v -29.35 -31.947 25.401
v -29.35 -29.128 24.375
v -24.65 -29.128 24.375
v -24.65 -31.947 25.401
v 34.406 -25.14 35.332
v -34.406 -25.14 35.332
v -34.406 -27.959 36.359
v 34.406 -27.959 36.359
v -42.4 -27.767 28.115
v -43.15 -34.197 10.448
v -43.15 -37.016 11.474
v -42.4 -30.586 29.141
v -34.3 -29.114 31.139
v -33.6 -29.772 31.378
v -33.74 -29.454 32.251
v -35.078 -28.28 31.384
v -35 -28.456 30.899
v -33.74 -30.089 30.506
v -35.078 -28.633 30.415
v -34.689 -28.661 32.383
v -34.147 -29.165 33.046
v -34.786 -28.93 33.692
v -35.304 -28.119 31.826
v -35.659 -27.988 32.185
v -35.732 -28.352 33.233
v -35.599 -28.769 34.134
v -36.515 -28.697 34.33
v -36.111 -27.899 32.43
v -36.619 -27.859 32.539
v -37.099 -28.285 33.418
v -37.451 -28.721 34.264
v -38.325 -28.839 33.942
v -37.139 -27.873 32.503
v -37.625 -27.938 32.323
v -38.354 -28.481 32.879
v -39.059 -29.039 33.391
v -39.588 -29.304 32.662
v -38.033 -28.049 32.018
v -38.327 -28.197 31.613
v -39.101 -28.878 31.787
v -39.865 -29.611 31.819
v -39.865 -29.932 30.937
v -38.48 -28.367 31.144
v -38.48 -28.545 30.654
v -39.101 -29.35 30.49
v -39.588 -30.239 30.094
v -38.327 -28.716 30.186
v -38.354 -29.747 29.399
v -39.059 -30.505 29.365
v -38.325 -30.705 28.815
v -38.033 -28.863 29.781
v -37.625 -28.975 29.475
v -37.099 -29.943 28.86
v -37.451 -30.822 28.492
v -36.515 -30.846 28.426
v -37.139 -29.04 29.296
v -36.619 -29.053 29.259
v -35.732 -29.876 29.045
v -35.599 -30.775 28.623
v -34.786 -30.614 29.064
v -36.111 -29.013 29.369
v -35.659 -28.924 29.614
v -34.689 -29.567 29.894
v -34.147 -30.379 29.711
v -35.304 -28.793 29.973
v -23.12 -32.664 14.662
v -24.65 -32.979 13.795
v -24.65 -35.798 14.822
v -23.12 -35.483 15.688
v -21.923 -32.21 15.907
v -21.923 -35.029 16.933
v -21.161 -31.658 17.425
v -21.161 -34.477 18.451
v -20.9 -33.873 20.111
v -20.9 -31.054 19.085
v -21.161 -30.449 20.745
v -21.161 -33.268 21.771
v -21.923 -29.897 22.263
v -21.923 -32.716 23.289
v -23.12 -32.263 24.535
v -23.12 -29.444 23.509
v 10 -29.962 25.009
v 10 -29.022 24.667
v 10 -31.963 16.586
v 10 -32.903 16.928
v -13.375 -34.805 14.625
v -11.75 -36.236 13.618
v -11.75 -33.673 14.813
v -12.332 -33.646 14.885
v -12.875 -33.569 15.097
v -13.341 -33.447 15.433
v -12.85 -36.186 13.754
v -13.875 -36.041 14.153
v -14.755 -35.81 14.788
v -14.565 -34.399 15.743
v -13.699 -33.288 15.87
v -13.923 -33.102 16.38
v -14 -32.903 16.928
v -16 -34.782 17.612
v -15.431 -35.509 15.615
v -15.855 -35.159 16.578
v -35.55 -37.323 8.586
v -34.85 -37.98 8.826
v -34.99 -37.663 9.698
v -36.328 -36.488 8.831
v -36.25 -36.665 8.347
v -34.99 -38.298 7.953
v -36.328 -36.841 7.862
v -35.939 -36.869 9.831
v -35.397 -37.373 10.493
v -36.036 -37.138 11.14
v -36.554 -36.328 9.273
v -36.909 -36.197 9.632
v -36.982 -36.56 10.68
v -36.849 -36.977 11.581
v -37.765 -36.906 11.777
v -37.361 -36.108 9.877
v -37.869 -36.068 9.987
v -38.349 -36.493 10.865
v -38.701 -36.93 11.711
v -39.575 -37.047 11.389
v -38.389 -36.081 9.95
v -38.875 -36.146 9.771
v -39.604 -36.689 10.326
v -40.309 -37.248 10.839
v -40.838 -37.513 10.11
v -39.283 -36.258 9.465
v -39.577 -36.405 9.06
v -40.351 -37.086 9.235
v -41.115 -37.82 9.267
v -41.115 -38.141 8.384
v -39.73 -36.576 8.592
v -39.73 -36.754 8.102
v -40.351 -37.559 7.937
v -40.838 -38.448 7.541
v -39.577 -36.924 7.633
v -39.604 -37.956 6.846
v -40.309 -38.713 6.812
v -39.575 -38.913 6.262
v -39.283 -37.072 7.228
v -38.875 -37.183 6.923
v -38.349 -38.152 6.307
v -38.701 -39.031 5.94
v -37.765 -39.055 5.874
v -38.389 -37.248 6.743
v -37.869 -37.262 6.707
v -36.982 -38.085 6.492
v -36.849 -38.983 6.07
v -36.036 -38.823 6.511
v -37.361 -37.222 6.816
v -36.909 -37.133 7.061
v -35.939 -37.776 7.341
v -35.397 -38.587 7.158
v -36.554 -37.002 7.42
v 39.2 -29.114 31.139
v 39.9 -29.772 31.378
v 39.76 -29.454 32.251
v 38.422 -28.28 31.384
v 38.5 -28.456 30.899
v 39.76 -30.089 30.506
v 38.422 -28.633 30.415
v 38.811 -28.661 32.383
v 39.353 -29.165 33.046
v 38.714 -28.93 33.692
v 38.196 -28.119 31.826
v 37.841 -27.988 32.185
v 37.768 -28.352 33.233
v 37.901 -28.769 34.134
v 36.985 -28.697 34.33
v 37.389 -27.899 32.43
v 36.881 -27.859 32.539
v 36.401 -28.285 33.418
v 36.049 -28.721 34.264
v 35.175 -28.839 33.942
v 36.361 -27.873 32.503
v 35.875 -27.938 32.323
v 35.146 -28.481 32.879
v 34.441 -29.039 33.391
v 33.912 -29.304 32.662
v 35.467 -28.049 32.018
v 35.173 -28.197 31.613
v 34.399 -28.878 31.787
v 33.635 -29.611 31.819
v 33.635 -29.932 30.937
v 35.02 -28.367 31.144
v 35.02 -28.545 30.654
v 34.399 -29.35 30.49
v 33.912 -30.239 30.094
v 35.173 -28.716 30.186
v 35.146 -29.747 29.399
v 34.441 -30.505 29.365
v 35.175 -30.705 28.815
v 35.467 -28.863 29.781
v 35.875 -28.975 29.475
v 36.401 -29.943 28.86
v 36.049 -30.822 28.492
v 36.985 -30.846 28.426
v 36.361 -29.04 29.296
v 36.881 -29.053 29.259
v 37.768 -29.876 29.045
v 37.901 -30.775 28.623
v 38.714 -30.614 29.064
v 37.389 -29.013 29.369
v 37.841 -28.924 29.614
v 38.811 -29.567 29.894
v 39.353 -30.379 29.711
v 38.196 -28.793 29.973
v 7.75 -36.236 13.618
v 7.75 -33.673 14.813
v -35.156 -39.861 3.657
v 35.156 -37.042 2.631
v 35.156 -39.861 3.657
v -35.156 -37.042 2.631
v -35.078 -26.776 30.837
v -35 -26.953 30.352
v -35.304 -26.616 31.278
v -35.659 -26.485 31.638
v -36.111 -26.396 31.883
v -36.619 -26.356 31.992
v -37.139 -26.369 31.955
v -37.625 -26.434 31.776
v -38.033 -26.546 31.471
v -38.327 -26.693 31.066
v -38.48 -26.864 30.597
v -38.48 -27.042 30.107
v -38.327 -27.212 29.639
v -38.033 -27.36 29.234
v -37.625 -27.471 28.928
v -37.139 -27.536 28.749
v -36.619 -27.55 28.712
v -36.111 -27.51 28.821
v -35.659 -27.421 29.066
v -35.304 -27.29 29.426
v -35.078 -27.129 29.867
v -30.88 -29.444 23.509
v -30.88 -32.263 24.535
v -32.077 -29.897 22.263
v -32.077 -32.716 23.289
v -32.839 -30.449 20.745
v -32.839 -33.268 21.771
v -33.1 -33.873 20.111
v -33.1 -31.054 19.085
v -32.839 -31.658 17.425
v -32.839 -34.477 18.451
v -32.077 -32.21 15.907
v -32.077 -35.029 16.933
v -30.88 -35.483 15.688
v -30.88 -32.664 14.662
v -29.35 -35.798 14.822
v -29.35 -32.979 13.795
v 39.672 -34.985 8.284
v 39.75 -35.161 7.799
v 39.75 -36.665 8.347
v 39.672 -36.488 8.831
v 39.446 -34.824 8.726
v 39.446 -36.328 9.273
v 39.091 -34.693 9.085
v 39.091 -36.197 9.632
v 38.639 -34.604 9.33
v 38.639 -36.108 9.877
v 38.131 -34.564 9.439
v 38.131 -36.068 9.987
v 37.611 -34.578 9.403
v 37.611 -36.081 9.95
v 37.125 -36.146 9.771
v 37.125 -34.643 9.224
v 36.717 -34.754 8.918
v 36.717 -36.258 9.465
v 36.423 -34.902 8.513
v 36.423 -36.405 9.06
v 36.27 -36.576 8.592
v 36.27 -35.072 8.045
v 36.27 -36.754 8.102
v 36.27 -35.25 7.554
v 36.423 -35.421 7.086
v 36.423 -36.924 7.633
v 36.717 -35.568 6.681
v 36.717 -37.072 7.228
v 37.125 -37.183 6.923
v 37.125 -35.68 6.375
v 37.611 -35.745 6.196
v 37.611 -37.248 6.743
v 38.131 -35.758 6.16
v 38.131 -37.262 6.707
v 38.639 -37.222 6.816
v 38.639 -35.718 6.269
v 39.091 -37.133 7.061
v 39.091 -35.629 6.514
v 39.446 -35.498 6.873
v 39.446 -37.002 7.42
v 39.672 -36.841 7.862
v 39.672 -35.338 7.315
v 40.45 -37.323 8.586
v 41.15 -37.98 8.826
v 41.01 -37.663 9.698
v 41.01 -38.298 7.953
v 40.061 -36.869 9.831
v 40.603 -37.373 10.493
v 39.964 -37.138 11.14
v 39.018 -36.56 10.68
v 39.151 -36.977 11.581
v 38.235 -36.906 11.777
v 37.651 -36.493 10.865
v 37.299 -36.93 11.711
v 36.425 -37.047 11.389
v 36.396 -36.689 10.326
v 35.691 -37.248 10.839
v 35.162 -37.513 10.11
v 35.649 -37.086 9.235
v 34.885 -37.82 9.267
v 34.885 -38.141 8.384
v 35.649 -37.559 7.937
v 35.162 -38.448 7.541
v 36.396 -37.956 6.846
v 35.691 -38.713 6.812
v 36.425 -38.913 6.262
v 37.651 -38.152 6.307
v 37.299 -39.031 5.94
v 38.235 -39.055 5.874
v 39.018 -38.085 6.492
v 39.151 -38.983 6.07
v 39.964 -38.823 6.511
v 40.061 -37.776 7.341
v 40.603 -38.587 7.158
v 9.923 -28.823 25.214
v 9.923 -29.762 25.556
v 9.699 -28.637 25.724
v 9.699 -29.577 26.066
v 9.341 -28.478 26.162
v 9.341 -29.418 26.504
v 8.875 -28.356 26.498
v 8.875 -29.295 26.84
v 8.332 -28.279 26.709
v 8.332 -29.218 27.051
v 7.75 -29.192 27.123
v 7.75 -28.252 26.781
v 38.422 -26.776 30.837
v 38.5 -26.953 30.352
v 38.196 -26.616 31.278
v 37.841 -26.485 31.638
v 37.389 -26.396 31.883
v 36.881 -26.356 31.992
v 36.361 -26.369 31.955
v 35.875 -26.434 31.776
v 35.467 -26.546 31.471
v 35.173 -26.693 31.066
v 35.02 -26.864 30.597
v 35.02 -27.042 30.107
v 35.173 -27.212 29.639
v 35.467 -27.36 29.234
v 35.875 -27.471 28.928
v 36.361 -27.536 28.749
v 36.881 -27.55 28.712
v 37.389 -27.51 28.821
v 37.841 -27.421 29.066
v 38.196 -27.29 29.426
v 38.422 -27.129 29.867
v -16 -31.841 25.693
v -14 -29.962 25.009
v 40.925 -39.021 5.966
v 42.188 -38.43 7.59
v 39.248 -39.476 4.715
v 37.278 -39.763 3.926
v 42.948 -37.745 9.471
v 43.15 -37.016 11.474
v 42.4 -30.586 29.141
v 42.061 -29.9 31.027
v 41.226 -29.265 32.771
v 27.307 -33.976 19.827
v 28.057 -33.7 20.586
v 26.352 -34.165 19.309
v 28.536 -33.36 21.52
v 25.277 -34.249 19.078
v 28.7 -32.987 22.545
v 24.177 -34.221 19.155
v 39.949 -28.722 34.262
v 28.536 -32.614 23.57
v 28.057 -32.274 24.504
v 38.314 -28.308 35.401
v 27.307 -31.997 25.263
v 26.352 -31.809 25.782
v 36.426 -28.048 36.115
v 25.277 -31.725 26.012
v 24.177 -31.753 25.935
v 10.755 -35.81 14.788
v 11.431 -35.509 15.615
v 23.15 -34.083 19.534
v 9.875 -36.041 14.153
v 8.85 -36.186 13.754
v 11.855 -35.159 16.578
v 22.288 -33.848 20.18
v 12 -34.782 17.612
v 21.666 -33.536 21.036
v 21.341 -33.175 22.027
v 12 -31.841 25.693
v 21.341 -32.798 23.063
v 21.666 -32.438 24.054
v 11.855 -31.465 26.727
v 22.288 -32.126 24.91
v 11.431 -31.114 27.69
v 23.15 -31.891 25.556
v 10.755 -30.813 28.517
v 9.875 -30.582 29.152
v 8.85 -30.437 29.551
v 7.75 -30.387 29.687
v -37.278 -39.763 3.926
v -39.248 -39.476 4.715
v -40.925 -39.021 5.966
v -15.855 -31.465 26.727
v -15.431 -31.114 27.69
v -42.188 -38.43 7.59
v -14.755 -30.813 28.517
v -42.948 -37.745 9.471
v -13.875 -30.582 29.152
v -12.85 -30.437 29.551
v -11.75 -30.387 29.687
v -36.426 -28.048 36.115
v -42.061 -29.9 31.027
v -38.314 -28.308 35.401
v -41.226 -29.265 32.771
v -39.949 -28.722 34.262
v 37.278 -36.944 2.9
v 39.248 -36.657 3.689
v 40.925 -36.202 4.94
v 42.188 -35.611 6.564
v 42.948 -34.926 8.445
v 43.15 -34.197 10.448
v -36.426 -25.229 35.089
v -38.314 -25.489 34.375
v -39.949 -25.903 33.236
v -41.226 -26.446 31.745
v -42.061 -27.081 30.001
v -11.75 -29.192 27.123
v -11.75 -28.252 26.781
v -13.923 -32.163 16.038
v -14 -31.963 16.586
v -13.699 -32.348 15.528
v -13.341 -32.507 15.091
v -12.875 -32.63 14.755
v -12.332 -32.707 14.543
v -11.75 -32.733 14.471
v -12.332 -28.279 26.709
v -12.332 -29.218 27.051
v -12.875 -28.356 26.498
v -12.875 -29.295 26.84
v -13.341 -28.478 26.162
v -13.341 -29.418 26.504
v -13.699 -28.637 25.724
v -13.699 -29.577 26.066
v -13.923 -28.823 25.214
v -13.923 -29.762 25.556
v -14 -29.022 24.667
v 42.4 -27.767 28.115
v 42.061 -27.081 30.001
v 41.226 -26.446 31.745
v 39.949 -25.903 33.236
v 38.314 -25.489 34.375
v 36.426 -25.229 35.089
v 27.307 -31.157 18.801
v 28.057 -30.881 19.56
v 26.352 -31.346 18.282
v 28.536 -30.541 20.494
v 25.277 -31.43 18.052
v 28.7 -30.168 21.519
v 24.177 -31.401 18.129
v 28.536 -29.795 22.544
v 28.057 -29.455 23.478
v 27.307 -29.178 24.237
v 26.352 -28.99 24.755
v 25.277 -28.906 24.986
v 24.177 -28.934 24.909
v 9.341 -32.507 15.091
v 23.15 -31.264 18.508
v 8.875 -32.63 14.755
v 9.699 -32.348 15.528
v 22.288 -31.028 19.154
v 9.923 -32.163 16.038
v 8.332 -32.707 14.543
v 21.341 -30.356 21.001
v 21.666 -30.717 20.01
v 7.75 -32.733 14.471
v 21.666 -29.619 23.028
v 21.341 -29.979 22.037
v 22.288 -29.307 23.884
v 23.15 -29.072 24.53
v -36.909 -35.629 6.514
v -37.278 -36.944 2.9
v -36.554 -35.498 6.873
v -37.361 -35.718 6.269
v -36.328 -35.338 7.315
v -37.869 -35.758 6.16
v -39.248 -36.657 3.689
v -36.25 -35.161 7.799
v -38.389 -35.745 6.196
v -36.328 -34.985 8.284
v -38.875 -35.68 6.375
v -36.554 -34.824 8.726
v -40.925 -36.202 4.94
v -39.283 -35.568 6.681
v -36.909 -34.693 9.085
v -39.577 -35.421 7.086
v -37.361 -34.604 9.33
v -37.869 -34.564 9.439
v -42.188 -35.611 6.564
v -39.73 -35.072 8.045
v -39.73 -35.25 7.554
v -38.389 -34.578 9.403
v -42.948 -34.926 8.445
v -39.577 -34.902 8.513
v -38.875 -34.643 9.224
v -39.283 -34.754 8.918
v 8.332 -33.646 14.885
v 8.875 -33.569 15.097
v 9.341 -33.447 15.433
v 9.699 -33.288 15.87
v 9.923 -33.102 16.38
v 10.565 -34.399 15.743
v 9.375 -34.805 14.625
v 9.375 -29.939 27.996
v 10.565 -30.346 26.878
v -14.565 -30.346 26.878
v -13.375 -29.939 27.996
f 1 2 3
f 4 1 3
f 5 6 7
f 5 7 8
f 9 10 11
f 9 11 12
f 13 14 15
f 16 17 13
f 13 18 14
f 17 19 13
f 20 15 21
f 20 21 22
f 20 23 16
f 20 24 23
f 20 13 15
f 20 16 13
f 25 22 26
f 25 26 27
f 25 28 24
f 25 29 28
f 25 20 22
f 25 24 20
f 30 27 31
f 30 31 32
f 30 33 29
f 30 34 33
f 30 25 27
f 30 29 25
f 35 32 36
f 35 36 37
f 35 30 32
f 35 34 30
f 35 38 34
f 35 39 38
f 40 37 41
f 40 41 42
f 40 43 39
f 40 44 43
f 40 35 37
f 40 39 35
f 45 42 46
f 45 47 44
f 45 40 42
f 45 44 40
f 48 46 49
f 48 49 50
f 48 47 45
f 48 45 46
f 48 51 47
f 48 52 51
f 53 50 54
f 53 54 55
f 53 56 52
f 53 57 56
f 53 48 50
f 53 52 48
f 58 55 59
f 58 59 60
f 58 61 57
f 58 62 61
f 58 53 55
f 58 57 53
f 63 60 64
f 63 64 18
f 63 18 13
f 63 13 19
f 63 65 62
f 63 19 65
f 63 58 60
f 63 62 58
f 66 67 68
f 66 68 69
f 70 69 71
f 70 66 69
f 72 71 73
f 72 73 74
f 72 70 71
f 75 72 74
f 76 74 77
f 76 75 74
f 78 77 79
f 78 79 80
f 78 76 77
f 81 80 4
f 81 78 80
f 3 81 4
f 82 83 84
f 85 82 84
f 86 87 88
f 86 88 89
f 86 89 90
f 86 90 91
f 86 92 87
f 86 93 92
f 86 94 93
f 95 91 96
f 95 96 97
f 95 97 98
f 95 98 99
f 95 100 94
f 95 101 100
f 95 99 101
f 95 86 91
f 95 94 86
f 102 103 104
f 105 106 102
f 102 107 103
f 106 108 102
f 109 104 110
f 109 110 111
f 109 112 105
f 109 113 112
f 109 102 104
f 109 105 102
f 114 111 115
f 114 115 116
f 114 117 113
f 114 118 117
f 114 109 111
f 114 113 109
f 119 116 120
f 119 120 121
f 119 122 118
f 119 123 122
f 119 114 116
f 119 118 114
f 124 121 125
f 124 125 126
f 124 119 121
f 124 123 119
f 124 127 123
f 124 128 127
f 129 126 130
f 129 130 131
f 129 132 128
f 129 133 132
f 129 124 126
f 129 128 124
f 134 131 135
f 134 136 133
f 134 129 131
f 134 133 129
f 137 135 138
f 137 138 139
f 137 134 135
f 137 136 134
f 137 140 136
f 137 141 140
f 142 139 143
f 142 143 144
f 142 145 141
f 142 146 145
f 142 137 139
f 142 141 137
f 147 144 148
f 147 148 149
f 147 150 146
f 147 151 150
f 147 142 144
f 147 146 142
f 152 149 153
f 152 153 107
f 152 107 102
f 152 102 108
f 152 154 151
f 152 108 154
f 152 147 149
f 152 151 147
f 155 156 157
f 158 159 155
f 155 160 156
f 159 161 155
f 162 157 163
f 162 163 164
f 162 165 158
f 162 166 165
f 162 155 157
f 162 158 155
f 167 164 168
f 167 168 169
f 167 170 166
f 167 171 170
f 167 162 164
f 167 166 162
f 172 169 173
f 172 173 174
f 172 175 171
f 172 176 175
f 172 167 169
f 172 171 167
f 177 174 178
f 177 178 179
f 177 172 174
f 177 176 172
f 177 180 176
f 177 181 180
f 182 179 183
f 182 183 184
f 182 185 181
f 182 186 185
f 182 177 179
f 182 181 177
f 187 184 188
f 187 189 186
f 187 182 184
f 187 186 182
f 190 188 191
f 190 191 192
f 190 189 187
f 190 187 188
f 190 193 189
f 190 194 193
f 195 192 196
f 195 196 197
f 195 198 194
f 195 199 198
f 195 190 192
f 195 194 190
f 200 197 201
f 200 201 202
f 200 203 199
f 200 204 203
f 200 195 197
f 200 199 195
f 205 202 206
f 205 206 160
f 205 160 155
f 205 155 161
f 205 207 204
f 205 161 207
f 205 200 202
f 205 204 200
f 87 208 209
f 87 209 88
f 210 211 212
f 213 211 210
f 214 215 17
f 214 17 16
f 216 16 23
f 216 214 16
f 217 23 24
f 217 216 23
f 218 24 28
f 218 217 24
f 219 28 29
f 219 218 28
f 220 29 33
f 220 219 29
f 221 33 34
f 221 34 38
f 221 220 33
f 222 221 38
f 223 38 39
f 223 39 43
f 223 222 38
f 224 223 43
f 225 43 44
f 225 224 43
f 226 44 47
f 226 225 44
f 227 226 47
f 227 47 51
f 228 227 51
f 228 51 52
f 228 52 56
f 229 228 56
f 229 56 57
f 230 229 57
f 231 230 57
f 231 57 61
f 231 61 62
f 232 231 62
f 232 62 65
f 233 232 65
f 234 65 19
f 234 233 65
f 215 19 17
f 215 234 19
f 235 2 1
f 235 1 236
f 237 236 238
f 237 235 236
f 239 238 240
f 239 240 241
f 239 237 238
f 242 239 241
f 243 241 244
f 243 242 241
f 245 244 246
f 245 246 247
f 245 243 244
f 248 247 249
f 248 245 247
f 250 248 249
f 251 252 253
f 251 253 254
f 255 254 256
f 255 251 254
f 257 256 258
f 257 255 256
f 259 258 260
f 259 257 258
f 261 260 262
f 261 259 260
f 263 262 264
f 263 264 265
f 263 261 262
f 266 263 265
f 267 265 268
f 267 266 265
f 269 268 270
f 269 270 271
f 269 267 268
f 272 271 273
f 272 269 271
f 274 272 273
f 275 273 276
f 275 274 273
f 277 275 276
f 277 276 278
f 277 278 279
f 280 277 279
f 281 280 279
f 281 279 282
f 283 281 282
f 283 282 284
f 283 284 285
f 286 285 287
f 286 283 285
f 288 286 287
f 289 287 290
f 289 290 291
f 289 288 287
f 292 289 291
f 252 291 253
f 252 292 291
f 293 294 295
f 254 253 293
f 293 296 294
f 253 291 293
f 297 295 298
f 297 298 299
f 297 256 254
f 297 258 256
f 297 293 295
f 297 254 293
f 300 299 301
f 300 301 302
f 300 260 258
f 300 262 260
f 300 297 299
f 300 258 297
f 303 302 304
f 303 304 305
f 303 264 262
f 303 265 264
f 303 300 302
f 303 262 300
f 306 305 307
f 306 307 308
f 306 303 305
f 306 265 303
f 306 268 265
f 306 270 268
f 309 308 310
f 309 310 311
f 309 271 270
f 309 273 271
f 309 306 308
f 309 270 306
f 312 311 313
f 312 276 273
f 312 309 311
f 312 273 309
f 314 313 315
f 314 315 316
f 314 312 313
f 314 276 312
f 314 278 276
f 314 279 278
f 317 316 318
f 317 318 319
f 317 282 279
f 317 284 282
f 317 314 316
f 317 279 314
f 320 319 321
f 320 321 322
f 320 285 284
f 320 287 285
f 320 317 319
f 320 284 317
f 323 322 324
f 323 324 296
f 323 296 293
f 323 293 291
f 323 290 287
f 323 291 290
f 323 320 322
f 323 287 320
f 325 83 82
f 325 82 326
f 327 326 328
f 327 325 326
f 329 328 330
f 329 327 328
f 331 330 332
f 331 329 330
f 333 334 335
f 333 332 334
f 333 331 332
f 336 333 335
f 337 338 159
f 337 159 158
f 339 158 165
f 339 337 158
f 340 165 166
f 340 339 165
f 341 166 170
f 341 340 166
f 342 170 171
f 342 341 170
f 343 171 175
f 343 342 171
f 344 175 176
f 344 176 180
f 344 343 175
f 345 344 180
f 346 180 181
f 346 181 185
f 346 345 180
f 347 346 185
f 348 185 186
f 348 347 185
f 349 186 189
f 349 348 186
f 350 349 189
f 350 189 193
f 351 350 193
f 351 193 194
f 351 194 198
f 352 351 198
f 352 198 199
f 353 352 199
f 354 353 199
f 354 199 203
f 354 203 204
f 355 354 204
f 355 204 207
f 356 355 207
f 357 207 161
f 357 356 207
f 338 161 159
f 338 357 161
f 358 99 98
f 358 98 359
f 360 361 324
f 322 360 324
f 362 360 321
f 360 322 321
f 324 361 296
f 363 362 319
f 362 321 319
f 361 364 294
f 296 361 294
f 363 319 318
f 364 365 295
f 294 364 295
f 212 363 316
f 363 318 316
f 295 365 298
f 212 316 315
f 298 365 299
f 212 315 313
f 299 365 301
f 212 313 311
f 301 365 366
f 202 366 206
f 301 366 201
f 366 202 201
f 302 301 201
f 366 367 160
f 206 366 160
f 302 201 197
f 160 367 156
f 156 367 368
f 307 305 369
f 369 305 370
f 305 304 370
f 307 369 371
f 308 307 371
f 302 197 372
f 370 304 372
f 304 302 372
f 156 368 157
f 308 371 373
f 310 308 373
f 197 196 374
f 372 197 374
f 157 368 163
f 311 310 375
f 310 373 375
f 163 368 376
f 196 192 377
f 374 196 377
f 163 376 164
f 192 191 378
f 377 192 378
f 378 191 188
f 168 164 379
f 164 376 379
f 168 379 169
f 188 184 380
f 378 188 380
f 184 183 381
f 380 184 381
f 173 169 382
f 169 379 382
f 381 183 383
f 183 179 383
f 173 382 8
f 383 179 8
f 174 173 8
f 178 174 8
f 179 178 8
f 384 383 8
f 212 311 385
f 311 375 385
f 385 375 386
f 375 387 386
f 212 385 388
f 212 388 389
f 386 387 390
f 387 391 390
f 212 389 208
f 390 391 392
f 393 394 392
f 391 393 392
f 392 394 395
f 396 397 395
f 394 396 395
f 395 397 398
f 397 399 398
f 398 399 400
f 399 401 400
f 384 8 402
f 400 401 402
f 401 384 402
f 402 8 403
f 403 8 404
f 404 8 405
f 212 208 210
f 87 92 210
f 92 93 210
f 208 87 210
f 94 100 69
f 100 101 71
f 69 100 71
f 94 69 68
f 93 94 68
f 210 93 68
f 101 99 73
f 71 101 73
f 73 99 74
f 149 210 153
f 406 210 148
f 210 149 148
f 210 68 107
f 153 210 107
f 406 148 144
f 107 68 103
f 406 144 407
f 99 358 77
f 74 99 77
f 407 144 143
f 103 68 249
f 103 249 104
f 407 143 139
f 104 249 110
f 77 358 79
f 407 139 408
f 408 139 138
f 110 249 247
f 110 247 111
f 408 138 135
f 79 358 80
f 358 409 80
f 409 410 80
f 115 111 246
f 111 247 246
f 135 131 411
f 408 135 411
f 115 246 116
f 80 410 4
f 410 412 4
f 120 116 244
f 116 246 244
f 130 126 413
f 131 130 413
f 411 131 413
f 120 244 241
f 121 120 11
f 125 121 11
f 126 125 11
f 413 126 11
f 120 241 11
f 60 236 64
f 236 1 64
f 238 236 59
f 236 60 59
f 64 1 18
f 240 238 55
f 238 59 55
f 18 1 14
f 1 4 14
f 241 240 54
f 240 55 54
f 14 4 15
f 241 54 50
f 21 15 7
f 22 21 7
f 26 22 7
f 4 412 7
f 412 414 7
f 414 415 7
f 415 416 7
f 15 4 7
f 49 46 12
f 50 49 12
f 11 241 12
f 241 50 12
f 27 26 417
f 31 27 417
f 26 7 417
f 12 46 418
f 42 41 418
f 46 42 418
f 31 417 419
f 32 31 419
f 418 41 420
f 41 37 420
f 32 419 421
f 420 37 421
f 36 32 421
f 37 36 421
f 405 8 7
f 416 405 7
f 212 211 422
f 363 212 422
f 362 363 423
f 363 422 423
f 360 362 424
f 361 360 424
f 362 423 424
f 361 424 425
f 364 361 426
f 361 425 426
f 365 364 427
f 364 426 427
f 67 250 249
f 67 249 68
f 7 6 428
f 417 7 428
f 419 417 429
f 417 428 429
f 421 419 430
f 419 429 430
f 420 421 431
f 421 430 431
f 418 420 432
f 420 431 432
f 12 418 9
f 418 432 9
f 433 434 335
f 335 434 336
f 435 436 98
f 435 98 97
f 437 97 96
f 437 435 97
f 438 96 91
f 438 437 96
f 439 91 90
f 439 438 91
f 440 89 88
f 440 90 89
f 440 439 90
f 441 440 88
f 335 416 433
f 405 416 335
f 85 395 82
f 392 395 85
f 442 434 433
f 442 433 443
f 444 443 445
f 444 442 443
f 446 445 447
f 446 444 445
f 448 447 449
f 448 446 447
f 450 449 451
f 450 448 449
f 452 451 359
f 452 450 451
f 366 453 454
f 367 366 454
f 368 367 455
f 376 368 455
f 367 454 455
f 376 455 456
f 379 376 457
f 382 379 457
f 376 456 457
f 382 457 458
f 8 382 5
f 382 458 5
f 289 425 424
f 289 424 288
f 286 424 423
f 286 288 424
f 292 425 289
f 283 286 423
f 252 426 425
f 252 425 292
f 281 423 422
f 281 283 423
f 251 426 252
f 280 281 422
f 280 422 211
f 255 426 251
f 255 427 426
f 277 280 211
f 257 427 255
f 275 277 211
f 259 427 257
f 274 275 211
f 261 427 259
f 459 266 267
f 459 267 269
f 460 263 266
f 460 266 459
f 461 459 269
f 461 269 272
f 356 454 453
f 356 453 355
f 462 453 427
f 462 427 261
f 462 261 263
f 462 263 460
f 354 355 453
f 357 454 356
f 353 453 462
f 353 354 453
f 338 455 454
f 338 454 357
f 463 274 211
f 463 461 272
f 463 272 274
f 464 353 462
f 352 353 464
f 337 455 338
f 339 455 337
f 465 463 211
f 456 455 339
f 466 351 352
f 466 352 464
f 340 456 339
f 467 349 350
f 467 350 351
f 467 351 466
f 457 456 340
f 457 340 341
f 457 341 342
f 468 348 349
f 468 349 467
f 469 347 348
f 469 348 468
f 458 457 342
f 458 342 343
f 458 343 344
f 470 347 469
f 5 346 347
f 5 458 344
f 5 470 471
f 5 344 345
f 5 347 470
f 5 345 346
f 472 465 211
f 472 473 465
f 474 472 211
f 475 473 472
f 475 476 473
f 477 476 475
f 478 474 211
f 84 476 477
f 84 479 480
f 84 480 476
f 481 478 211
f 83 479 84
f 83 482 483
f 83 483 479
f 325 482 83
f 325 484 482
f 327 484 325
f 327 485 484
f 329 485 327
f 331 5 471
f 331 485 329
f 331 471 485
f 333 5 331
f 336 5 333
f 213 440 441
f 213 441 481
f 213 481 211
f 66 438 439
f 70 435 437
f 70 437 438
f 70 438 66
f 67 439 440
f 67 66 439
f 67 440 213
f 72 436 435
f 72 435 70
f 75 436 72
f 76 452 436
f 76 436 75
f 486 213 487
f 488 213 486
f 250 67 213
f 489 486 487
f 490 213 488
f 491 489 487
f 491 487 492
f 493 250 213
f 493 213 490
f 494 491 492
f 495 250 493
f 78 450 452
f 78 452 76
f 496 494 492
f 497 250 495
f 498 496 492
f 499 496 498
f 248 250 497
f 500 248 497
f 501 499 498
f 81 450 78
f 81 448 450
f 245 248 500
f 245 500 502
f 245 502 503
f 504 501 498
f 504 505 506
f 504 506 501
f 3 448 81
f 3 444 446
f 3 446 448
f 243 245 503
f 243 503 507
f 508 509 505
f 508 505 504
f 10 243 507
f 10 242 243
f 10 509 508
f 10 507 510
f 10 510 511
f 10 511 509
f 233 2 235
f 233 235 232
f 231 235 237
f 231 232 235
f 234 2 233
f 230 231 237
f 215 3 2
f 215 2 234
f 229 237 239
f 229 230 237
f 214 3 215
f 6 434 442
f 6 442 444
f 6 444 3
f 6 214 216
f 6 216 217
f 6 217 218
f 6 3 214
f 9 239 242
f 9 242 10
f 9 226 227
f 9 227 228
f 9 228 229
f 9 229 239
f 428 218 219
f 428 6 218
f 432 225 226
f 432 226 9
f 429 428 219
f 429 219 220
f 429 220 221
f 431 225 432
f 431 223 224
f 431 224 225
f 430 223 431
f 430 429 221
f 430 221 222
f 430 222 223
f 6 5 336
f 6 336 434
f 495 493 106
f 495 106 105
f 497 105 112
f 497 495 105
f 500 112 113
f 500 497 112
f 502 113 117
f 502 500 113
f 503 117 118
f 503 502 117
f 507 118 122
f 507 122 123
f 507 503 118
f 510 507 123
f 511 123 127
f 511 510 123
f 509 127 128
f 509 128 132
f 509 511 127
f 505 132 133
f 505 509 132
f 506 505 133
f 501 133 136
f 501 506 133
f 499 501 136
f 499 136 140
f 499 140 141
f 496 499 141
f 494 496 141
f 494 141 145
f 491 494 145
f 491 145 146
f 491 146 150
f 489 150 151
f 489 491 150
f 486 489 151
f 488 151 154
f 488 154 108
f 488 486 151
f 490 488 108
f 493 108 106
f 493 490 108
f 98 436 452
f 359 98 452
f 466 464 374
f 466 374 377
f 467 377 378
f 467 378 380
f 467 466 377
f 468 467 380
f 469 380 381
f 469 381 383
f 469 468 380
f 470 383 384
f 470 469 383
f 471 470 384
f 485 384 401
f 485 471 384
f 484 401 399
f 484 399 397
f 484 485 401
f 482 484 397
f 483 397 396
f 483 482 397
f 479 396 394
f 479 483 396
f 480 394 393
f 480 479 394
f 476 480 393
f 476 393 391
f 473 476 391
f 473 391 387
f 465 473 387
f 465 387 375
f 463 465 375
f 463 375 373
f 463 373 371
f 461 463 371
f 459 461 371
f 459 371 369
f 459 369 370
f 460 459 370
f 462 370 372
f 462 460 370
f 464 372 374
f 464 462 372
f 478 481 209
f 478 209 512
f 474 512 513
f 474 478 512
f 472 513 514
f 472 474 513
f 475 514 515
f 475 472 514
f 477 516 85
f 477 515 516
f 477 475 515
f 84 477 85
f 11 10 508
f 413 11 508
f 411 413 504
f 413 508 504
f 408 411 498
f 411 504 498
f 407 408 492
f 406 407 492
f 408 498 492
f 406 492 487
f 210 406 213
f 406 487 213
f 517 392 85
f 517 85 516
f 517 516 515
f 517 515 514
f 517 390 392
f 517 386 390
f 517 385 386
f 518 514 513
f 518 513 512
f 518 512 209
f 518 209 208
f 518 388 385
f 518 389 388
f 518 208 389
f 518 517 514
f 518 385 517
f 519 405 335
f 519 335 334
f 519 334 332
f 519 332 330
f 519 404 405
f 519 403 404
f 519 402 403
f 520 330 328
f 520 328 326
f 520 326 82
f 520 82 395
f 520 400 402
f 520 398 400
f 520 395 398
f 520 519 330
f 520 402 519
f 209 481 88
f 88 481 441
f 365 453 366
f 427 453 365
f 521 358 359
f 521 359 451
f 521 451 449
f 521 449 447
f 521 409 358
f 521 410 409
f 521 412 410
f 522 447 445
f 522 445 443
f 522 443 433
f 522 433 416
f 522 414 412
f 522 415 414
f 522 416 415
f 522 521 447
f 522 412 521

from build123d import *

# Parameters (mm, degrees)
SKETCH033_R     = 1.75
SKETCH033_R_2   = 3.7
PAD001_DEPTH    = 3
CHAMFER001_SIZE = 2
CHAMFER002_SIZE = 1.4


with BuildPart() as part:
    # Sketch033 → Pad001 (new body)
    with BuildSketch(Plane(origin=(0, -38, 0), x_dir=(1, 0, 0), z_dir=(0, -0.939693, 0.34202))):
        with BuildLine():
            Line((-34.406356, 37.6), (34.406361, 37.6))
            ThreePointArc((42.400003, 29.918894), (39.949322, 35.368499), (34.406361, 37.6))
            Line((42.400003, 29.918894), (43.15, 11.118894))
            ThreePointArc((35.156359, 2.8), (40.924857, 5.257038), (43.15, 11.118894))
            Line((35.156359, 2.8), (-35.156359, 2.8))
            ThreePointArc((-43.15, 11.118896), (-40.924858, 5.257039), (-35.156359, 2.8))
            Line((-43.15, 11.118896), (-42.399997, 29.918896))
            ThreePointArc((-34.406356, 37.6), (-39.949317, 35.368499), (-42.399997, 29.918896))
        make_face()
        with Locations((-36.75, 32.3)):
            Circle(SKETCH033_R, mode=Mode.SUBTRACT)
        with Locations((36.75, 32.3)):
            Circle(SKETCH033_R, mode=Mode.SUBTRACT)
        with Locations((-38, 8.3)):
            Circle(SKETCH033_R, mode=Mode.SUBTRACT)
        with Locations((38, 8.3)):
            Circle(SKETCH033_R, mode=Mode.SUBTRACT)
        with Locations((25, 22.9)):
            Circle(SKETCH033_R_2, mode=Mode.SUBTRACT)
        with BuildLine():
            Line((-11.75, 28.5), (7.75, 28.5))
            ThreePointArc((10, 26.25), (9.34099, 27.84099), (7.75, 28.5))
            Line((10, 26.25), (10, 17.65))
            ThreePointArc((7.75, 15.4), (9.34099, 16.05901), (10, 17.65))
            Line((7.75, 15.4), (-11.75, 15.4))
            ThreePointArc((-14, 17.65), (-13.34099, 16.05901), (-11.75, 15.4))
            Line((-14, 17.65), (-14, 26.25))
            ThreePointArc((-11.75, 28.5), (-13.34099, 27.84099), (-14, 26.25))
        make_face(mode=Mode.SUBTRACT)
        with BuildLine():
            Line((-29.35, 25.939165), (-24.65, 25.939165))
            ThreePointArc((-24.65, 14.680835), (-20.9, 20.31), (-24.65, 25.939165))
            Line((-29.35, 14.680835), (-24.65, 14.680835))
            ThreePointArc((-29.35, 25.939165), (-33.1, 20.31), (-29.35, 14.680835))
        make_face(mode=Mode.SUBTRACT)
    extrude(amount=PAD001_DEPTH)

    # Chamfer001
    chamfer001_edges = [part.edges().sort_by_distance(p)[0] for p in [
        (-2, -31.071504, 27.8073),
    ]]
    chamfer(chamfer001_edges, length=CHAMFER001_SIZE)

    # Chamfer002
    chamfer002_edges = [part.edges().sort_by_distance(p)[0] for p in [
        (-38.5, -29.771827, 31.378132),
        (-39.75, -37.980311, 8.825509),
        (35, -29.771827, 31.378132),
        (36.25, -37.980311, 8.825509),
    ]]
    chamfer(chamfer002_edges, length=CHAMFER002_SIZE)


solid = part.part
